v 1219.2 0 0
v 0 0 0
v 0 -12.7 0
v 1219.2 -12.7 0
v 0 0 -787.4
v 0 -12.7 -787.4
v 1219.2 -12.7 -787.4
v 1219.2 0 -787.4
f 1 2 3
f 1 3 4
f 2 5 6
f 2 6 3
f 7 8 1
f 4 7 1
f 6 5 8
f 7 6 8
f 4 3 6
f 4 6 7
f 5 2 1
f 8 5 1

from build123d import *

# Parameters (mm, degrees)
F0_W     = 1219.2
F0_H     = 787.4
F1_DEPTH = 12.7


with BuildPart() as f1:
    # F0 (on Front) → F1 (new body)
    with BuildSketch(Plane.XZ):
        with Locations((609.6, -393.7)):
            Rectangle(F0_W, F0_H)
    extrude(amount=F1_DEPTH)


with BuildPart() as f3_1:
    # F3: copy of F1
    add(f1.part)


solid = f1.part
